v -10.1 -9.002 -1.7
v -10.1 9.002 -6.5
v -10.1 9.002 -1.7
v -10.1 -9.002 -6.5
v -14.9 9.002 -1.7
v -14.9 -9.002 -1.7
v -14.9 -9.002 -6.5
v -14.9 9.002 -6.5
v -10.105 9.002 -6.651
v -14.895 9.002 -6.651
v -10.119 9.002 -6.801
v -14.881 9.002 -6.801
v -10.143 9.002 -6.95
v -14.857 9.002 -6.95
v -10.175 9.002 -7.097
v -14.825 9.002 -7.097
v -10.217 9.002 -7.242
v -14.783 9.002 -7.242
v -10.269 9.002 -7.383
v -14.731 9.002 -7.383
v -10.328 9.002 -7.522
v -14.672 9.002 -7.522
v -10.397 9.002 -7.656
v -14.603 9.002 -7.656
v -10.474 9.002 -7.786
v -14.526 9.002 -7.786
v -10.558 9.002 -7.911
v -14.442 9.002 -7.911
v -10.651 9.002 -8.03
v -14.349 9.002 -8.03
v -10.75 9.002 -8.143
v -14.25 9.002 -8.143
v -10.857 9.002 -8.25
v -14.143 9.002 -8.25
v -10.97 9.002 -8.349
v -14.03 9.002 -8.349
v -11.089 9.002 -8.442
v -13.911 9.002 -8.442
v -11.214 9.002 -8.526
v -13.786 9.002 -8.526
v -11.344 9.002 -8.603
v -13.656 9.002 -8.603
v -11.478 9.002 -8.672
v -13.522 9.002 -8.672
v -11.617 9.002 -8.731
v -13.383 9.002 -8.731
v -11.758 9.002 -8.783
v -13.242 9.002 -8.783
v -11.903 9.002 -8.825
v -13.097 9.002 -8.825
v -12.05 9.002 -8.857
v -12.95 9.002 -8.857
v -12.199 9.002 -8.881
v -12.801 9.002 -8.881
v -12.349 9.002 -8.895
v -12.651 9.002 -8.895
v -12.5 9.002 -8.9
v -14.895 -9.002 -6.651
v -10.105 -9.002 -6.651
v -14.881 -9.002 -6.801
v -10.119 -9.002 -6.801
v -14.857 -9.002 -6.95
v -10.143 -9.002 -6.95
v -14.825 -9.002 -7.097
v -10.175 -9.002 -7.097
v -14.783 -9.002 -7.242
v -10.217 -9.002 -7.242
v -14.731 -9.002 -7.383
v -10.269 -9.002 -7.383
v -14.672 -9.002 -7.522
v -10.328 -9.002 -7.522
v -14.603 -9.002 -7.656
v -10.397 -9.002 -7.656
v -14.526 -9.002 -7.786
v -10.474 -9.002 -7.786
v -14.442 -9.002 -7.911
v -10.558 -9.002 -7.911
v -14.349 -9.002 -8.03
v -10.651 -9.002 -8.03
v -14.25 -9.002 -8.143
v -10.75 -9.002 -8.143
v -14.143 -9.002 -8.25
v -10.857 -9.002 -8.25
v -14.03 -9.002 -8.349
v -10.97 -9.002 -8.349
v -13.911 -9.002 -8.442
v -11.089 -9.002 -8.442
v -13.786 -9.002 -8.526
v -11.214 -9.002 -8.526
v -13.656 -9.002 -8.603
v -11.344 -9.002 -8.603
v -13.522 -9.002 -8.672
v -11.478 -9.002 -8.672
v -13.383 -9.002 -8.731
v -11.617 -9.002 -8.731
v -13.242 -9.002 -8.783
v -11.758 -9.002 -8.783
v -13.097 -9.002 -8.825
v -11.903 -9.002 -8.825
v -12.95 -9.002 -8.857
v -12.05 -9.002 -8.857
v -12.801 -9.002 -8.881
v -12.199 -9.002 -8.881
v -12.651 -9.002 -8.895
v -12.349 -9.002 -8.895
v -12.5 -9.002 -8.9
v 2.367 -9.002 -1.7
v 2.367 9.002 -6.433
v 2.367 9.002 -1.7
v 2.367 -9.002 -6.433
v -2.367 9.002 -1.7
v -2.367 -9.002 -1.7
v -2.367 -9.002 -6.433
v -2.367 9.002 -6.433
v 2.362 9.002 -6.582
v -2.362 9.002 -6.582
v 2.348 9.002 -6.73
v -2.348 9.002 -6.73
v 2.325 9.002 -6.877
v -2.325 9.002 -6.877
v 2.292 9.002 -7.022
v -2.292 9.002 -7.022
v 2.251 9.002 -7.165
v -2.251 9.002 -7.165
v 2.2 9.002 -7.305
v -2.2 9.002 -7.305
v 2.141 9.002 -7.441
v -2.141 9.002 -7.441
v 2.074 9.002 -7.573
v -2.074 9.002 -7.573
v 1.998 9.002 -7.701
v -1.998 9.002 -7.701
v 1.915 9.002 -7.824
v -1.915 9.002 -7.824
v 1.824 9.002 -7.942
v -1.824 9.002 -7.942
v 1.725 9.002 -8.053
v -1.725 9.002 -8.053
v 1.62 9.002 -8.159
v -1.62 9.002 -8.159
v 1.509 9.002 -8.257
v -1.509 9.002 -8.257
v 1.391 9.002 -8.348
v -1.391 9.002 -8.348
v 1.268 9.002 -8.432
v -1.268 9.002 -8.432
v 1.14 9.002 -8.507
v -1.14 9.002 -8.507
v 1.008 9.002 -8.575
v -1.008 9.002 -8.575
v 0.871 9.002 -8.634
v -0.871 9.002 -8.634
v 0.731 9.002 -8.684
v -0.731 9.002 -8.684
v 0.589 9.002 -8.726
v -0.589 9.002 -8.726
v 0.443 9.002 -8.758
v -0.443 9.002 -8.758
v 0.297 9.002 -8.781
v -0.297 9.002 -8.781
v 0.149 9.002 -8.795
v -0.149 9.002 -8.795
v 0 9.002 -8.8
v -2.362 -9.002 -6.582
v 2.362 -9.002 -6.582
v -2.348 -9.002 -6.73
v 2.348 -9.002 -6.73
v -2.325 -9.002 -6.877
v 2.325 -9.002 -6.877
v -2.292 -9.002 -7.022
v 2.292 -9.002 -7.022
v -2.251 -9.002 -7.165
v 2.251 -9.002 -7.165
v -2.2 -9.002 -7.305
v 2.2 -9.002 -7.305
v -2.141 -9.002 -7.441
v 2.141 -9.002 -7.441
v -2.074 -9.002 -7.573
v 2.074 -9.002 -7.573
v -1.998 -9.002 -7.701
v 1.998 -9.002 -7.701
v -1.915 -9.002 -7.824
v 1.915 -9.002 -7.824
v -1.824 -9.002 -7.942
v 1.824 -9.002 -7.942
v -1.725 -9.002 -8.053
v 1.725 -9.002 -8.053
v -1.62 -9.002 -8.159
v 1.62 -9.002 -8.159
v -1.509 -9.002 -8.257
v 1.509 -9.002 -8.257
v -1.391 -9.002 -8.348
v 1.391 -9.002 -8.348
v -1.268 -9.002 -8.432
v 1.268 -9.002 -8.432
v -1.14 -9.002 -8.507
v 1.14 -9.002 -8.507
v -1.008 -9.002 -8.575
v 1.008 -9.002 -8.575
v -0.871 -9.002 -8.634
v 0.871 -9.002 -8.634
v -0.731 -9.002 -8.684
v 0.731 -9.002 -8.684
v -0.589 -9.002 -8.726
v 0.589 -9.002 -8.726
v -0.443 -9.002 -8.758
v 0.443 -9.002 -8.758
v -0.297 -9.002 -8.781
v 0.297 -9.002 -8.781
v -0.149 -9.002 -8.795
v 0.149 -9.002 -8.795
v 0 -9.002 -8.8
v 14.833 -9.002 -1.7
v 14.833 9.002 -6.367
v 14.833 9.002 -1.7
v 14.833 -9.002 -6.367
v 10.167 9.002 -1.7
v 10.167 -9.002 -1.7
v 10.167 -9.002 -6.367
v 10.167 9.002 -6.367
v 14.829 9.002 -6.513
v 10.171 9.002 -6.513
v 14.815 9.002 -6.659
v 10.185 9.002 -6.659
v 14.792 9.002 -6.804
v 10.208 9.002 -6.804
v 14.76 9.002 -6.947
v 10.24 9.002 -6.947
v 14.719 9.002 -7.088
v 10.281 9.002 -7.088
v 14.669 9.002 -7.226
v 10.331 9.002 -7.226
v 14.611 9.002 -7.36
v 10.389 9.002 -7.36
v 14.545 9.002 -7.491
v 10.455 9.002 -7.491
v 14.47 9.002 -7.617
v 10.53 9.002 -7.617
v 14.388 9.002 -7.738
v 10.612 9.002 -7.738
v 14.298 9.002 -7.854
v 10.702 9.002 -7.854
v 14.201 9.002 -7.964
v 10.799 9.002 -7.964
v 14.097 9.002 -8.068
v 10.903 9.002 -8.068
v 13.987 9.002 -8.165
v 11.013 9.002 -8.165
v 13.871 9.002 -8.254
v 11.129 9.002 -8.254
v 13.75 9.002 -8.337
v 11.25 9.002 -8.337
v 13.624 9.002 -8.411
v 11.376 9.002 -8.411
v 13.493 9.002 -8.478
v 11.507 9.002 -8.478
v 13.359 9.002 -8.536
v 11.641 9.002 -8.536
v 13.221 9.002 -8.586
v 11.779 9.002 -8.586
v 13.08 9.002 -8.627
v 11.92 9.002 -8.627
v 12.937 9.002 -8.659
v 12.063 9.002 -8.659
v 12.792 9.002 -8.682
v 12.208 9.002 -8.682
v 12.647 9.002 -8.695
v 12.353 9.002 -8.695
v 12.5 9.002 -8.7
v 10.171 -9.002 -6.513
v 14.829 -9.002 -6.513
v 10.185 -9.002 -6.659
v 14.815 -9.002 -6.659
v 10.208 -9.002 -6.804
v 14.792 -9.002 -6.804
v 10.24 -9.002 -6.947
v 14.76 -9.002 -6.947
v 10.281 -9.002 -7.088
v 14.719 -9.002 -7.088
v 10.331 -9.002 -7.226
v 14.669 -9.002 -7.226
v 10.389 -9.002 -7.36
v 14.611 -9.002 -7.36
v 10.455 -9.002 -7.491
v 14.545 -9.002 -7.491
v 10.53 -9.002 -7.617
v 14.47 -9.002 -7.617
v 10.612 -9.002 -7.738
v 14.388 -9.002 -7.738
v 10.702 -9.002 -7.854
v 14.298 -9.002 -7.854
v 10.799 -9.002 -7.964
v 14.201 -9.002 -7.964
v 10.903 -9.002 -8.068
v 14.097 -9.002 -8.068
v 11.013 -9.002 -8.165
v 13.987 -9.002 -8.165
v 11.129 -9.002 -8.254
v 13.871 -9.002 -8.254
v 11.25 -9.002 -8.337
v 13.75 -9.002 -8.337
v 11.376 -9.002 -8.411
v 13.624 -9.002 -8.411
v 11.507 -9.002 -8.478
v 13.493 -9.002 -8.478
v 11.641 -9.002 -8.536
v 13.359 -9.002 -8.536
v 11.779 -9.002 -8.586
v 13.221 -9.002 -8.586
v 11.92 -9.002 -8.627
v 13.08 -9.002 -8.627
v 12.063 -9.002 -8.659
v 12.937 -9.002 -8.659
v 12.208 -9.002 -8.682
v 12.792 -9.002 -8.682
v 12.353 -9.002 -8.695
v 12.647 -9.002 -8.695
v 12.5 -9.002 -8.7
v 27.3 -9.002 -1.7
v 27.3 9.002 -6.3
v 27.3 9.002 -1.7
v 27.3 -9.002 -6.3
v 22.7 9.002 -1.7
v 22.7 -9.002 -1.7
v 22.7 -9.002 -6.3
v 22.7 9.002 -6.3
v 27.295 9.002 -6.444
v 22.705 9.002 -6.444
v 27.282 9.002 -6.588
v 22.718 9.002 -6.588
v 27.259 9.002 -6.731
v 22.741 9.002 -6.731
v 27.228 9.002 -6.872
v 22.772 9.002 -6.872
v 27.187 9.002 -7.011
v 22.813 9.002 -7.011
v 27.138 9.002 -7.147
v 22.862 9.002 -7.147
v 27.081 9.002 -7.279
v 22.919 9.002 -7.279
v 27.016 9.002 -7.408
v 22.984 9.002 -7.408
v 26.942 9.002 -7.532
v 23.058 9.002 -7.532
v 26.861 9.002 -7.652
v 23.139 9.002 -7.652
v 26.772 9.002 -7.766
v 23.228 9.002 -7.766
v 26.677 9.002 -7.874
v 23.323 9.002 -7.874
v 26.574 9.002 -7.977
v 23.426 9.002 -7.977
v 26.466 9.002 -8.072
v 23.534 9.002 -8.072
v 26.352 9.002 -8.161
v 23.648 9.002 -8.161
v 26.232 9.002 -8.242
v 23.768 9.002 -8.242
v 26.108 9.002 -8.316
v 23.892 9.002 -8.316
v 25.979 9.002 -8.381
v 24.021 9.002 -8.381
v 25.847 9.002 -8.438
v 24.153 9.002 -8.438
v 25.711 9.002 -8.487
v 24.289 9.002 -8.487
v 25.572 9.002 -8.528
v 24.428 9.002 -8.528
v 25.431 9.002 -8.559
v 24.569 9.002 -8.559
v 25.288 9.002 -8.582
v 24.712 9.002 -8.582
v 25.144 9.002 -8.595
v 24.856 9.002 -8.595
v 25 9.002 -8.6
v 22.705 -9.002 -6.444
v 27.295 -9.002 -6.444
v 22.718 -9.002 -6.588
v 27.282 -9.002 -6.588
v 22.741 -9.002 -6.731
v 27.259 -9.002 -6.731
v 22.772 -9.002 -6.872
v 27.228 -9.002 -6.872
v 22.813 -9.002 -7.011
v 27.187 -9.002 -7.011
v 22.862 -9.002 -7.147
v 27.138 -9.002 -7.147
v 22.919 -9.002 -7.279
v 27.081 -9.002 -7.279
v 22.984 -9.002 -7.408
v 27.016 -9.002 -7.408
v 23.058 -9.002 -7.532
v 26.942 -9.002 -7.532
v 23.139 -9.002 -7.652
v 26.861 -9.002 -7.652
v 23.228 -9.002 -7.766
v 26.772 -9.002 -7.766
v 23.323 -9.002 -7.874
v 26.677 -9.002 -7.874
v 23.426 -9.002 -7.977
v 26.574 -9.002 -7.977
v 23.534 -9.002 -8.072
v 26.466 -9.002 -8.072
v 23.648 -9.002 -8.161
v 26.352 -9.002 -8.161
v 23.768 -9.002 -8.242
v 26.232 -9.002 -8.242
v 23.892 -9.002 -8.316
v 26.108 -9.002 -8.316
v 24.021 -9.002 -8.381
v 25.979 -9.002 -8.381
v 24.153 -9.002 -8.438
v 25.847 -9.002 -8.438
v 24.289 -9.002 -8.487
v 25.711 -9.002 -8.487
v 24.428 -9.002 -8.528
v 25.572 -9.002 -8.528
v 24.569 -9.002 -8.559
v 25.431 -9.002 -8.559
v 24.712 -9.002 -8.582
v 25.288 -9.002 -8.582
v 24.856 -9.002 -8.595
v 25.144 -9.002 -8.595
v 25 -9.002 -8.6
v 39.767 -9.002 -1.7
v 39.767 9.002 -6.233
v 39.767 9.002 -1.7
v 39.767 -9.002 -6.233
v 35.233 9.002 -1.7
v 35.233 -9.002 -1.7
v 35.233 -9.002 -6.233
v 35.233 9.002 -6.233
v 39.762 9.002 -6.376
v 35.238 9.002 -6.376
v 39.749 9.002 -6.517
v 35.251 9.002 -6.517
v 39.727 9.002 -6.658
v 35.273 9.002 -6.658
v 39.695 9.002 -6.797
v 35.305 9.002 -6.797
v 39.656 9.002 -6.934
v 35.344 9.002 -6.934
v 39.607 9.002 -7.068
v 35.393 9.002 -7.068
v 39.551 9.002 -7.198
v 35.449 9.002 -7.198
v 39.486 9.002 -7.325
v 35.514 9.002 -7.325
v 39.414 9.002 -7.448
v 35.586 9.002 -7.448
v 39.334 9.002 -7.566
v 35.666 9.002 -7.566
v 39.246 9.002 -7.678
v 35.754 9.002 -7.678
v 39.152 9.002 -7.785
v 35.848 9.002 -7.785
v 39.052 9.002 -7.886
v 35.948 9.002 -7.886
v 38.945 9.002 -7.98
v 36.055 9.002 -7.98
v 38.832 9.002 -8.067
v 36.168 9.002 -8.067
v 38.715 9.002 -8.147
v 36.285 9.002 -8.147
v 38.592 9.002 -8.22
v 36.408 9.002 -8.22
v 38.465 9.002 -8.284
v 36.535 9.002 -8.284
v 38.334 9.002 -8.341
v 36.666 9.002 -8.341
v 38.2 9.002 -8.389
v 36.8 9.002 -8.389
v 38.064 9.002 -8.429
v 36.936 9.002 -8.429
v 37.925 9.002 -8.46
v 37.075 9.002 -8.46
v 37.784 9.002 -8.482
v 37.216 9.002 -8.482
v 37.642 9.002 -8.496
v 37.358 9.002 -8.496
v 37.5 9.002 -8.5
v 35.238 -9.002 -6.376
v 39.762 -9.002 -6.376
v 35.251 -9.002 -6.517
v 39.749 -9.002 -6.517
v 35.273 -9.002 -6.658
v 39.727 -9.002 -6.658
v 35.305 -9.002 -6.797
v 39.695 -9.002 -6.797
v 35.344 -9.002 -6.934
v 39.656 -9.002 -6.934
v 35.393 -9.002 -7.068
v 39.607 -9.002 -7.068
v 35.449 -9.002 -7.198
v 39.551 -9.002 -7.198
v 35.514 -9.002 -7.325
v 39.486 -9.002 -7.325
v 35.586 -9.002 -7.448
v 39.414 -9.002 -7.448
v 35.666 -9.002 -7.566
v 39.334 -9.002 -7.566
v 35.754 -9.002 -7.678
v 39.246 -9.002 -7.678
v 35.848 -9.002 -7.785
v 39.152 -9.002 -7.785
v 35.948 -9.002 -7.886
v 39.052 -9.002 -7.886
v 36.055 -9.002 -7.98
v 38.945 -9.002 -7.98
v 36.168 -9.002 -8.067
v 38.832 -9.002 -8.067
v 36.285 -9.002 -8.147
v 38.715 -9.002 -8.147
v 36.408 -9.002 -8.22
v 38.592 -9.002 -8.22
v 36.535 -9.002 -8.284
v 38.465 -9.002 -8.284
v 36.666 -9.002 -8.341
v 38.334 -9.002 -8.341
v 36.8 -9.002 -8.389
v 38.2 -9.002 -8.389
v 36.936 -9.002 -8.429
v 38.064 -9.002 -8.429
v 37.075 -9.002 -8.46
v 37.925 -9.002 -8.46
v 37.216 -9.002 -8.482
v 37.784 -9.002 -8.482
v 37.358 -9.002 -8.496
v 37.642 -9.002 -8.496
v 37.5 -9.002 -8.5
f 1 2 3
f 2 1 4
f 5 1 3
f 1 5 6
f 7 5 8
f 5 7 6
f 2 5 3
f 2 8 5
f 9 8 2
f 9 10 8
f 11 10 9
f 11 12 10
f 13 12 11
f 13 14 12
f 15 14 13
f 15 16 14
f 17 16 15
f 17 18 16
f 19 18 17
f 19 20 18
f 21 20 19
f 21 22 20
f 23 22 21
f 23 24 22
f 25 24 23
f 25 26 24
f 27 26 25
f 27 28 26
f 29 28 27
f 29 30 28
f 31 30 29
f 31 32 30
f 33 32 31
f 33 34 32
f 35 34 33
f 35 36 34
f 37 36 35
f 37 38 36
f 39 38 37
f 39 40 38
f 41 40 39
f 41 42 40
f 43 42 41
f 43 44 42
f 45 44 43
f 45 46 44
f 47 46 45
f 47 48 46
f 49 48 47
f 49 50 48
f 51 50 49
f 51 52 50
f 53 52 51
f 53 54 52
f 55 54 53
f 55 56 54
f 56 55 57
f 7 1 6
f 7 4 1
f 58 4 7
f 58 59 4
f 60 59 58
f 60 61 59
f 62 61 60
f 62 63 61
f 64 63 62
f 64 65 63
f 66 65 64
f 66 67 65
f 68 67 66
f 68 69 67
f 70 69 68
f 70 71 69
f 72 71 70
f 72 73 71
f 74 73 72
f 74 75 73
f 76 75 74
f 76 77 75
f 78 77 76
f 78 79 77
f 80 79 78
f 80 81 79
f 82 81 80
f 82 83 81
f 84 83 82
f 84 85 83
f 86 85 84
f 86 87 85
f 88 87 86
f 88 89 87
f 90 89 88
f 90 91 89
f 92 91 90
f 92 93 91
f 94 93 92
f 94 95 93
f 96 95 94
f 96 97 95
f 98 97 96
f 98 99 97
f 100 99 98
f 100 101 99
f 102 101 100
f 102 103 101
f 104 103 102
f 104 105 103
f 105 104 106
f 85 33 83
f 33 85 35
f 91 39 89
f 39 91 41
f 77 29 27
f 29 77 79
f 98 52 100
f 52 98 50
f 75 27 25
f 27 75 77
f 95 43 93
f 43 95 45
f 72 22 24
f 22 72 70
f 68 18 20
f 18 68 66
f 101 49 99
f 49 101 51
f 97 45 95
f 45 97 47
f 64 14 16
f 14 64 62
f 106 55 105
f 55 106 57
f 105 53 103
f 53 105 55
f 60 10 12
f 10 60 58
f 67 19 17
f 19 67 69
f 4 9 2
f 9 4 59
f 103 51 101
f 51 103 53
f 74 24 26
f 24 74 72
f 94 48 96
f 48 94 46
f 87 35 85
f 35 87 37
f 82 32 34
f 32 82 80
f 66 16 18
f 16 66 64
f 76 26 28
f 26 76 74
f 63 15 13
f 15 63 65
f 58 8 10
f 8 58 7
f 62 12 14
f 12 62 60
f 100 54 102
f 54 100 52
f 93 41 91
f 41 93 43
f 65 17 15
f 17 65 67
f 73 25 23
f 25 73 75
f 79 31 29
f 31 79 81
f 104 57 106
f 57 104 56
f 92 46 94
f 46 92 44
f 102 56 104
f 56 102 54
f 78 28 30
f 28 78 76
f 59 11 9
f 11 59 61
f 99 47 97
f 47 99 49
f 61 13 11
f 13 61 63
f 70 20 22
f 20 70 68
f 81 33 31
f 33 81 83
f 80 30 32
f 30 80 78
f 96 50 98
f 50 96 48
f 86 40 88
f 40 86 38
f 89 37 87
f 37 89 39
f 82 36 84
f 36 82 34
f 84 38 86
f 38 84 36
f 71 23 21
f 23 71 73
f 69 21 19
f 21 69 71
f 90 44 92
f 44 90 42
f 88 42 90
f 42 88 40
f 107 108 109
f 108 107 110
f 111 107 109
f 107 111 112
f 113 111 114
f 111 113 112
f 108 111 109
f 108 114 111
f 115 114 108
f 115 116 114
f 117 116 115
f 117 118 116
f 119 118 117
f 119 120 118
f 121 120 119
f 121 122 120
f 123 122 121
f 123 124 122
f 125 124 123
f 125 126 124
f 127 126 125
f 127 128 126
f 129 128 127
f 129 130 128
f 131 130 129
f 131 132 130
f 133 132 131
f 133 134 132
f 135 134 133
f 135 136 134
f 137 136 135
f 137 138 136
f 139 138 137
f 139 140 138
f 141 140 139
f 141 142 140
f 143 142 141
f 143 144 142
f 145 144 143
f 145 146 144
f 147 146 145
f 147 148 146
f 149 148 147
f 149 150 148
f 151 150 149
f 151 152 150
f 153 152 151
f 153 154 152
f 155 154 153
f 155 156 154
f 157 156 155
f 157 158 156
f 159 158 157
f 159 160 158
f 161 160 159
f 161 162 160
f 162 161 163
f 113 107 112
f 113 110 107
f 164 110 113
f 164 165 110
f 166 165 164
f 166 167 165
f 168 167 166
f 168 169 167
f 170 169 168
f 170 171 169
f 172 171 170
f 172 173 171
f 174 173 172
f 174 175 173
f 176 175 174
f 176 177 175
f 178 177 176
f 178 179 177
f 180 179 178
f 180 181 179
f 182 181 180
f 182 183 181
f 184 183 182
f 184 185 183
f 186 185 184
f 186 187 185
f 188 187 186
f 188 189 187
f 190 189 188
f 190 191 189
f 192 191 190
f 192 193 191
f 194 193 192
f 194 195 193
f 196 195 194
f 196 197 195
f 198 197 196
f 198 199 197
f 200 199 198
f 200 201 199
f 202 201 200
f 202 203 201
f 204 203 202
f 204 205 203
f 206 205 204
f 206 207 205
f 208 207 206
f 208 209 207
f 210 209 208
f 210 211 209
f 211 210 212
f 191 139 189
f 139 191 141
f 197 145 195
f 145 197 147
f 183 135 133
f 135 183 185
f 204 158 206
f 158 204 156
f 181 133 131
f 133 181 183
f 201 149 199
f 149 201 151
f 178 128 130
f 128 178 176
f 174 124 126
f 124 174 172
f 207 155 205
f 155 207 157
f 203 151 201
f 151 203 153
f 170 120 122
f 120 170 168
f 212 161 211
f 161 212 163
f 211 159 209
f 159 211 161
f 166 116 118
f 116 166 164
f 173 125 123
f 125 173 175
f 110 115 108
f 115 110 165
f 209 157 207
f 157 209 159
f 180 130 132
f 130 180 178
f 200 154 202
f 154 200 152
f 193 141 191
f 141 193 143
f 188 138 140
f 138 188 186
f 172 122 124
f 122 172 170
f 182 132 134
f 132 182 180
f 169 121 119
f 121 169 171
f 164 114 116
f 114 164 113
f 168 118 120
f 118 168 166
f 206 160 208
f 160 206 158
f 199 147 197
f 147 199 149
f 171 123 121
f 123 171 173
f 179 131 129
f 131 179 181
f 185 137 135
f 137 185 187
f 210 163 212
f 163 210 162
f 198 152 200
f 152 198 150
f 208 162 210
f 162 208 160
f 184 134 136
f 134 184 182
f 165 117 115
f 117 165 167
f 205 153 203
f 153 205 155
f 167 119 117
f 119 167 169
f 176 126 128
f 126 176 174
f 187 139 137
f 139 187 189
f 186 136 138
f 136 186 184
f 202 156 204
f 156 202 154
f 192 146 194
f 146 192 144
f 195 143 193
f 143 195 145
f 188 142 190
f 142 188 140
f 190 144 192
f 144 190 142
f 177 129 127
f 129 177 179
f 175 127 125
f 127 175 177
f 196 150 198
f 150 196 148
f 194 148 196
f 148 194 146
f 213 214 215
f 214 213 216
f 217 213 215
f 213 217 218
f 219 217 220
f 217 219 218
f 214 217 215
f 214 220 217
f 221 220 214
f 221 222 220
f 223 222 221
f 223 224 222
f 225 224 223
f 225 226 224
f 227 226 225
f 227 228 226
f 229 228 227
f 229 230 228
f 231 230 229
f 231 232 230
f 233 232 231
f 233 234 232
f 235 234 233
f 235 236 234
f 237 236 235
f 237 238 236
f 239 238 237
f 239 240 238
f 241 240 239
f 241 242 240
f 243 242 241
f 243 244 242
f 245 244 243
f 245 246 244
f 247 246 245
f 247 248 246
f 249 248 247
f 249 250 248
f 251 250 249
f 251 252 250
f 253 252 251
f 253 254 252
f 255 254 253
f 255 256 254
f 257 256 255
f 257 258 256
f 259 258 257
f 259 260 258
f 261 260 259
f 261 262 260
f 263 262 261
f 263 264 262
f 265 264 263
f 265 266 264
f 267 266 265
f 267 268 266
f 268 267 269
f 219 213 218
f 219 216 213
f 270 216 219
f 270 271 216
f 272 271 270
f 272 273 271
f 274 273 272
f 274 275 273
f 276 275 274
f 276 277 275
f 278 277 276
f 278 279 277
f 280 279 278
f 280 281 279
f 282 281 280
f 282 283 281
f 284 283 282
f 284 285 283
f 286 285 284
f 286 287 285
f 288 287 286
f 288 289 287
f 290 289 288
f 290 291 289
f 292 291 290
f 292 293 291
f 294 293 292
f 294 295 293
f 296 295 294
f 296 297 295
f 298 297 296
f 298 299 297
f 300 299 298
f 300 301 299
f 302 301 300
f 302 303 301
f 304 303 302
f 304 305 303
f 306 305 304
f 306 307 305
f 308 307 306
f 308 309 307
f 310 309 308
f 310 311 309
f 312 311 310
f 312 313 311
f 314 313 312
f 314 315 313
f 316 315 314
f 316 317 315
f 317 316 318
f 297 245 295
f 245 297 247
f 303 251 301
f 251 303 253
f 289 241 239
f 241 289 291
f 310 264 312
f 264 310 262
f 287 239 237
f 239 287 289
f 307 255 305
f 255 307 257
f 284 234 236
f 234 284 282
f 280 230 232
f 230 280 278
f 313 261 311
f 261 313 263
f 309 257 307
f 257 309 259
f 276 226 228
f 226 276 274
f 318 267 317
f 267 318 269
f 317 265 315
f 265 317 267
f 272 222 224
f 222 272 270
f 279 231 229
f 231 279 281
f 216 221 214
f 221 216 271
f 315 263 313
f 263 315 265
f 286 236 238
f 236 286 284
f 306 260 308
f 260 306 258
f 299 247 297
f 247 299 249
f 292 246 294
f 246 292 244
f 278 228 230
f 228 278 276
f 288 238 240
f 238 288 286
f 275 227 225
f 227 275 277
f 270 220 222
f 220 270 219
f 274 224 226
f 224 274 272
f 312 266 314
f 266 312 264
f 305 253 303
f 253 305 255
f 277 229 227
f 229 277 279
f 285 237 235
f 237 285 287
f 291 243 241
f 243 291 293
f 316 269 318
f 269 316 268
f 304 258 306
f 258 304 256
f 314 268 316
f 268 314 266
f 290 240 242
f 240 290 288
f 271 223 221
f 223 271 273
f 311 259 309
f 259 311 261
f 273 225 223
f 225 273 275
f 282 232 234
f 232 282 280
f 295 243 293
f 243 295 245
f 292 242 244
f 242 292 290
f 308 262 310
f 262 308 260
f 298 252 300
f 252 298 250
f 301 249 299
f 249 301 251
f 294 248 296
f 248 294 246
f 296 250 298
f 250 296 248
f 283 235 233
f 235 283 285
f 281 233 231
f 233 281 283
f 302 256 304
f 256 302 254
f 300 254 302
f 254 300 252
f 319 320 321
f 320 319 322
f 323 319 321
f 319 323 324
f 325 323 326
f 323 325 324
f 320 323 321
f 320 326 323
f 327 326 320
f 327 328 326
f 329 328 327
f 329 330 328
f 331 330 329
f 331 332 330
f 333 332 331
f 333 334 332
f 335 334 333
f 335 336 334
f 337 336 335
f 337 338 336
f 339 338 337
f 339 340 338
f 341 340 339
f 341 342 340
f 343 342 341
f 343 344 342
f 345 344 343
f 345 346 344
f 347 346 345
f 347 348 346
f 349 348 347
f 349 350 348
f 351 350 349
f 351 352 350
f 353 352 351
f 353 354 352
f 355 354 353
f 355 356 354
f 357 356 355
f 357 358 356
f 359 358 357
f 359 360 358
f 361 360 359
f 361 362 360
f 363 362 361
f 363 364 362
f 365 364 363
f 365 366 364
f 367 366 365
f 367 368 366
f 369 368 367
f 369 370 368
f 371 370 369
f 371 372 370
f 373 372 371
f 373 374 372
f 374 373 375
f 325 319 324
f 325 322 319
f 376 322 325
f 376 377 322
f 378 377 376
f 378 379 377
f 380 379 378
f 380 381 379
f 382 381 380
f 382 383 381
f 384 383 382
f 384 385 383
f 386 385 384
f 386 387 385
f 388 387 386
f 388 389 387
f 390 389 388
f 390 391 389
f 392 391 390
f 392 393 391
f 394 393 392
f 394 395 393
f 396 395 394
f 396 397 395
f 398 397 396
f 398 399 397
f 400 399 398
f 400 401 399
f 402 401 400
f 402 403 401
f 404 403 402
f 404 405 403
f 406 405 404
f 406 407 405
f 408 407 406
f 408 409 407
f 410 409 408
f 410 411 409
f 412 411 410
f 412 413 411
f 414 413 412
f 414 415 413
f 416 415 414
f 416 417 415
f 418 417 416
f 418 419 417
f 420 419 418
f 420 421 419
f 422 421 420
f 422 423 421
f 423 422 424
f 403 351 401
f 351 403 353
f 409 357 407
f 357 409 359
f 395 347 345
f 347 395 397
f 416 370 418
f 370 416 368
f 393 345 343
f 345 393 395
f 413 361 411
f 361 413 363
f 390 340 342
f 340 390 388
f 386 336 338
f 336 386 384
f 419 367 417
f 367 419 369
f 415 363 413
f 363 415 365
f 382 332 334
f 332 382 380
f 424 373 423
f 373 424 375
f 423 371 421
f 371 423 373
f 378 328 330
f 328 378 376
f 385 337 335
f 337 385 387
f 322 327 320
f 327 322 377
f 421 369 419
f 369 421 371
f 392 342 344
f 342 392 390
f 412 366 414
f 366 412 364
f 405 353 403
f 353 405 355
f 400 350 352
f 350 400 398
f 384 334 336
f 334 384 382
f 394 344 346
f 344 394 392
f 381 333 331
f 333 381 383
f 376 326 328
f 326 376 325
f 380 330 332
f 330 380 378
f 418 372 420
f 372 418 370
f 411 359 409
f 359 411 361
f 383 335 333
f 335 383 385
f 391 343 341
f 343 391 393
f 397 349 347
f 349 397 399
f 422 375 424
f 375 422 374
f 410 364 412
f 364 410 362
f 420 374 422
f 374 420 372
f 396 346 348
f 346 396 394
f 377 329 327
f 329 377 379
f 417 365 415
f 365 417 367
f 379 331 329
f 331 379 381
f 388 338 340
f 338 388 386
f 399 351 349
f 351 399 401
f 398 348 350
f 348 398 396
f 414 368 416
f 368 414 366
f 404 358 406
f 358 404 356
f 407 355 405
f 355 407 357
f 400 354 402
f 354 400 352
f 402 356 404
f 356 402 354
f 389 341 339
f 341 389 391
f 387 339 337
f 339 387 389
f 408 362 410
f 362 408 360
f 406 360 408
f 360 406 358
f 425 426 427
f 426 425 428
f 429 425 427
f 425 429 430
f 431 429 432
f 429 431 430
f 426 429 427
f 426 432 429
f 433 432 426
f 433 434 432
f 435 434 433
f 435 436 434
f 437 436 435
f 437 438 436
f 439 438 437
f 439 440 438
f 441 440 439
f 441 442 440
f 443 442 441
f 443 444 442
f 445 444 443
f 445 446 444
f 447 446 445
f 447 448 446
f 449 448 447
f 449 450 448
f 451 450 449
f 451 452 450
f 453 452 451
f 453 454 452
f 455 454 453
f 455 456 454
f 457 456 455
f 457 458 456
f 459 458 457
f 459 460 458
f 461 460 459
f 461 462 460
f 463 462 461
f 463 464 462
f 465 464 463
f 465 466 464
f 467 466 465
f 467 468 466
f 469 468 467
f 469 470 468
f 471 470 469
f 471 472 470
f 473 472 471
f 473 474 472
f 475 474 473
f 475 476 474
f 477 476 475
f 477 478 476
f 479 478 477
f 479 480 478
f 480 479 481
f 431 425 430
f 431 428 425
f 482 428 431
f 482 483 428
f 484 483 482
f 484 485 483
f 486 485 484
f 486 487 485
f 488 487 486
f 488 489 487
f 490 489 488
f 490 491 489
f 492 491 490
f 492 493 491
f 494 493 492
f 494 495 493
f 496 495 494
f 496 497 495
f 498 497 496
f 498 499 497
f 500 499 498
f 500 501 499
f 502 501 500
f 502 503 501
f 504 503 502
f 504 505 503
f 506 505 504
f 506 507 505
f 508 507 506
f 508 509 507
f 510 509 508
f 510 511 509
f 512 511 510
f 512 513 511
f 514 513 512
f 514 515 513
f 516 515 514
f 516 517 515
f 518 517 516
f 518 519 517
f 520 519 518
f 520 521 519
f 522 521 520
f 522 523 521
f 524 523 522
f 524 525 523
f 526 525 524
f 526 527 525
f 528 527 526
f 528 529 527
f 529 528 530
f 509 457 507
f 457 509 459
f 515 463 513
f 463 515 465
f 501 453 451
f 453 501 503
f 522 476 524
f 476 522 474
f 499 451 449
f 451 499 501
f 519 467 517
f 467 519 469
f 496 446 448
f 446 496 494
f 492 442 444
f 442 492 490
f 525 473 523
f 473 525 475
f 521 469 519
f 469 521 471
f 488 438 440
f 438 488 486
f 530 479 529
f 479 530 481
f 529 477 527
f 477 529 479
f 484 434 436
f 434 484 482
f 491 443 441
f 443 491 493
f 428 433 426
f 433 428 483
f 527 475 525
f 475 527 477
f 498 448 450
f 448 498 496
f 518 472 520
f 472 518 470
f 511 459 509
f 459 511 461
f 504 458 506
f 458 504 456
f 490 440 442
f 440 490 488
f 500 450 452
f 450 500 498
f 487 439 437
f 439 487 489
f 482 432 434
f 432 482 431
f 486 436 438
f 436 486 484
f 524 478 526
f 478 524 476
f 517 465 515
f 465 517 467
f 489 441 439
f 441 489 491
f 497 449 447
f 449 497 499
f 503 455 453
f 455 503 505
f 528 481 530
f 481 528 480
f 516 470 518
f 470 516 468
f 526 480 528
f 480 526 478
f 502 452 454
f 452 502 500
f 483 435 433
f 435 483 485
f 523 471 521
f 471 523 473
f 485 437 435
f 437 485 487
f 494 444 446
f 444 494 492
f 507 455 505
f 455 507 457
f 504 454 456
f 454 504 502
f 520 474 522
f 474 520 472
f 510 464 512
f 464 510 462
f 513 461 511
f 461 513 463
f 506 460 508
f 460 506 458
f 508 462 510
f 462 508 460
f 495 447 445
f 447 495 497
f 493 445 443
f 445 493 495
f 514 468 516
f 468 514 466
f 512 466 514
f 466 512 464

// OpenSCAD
$fn=100;

frameFrontThickness = 2;
frameWallThickness  = 2;

usbFrontWidth        = 31;
usbFrontHeight       = 10;
usbFrontDepth        = 1.7;

usbBaseWidth            = 13;
usbBaseHeight           = 7;
usbBaseDepth            = 19;

usbFrontOffset      = 0;

UsbMountThingyWidth = 5;
UsbMountThingyHeight = UsbMountThingyWidth*1.5;

displayWidth        = 51;
displayHeight       = 20;
displayDepth        = 8;

displayBaseWidth    = 72;
displayBaseHeight   = 28;
displayBaseDepth    = usbBaseDepth;

//displayFrontOffset  = frameFrontThickness;
displayFrontOffset  = 0.4;


buttonDiameterTop   = 20;
buttonDiameterBottom= 25;
buttonDepth         = 2;

buttonBaseDiameter  = 23;
buttonBaseDepth     = usbBaseDepth;

buttonFrontOffset   = frameFrontThickness;


frameWidth          = displayWidth*2+usbBaseWidth*2+buttonDiameterBottom*2;
frameHeight         = displayHeight*2;
frameDepth          = frameFrontThickness;

frameBaseWidth      = frameWidth-4;
frameBaseHeight     = frameHeight-4;
frameBaseDepth      = usbBaseDepth-frameFrontThickness-0.1;


//usbThingyWidth = usbFrontHeight*0.6;
//usbThingyBridgeHeight = usbBaseHeight*4;
//usbThingyContactDepth = frameBaseDepth/2 - usbFrontDepth;

usbXcenterPos = -displayBaseWidth+5;

module Layer01a_UsbMountThingy()
{    
    translate([0,0,-UsbMountThingyWidth/2]) cube([UsbMountThingyWidth,frameBaseHeight+0.01,UsbMountThingyWidth], center=true);

    translate([0,0,+UsbMountThingyWidth/2-UsbMountThingyHeight]) rotate([90,0,0]) cylinder(h=frameBaseHeight+0.01, d=UsbMountThingyWidth, center=true);
}

module Layer01b_UsbMountThingies(distance,scale) 
{
    for(xPos = [-distance/2, +distance/2]) {
        translate([xPos,0,usbFrontOffset-usbFrontDepth])scale([scale,1,scale])
Layer01a_UsbMountThingy();        
    }
}

module Layer01c_UsbMountThingiesFitSelection() 
{
    for(count = [3,4,5,6,7]) {
        translate([UsbMountThingyWidth*(count-4)*2.5,0,usbFrontOffset])scale([1,0.5,1])Layer01b_UsbMountThingies(0, (UsbMountThingyHeight-count*0.1)/UsbMountThingyHeight);
    }
}

module Layer01_UsbCutout()
{
    color("green") {    
    
        // Frame cutout
        translate([0,0,+usbBaseDepth/2-0.01]) cube([usbBaseWidth+2, usbBaseHeight+2, usbBaseDepth], center=true);
    
        // Device base
        translate([0,0,-usbBaseDepth/2]) cube([usbFrontWidth+0.25, usbFrontHeight+0.25, usbBaseDepth], center=true);

    translate([0,0,usbFrontOffset])Layer01b_UsbMountThingies(usbFrontWidth-UsbMountThingyWidth, 1);
    }    
}

module Layer02_DisplayCutout()
{
    color("red") {
//        // Frame cutout
//        translate([0,0,+displayDepth/2-0.01]) cube([displayWidth-2, displayHeight-2, displayDepth], center=true);
        
        // Actual display
        translate([0,0,-displayDepth/2]) cube([displayWidth, displayHeight, displayDepth], center=true);

        // Display base
        translate([0,0,-displayDepth-displayBaseDepth/2+0.01]) cube([displayBaseWidth, displayBaseHeight, displayBaseDepth], center=true);
    }
}

module Layer03_PushbuttonCutout()
{
    color("blue") {    
        // Actual button
        translate([0,0,+buttonDepth/2]) cylinder(h=buttonDepth, d1=buttonDiameterBottom, d2=buttonDiameterTop, center=true);

        // Button base
        translate([0,0,-buttonBaseDepth/2+0.01]) cylinder(h=buttonBaseDepth, d=buttonBaseDiameter, center=true);
        
        // Button base mount space
        translate([0,0,-frameFrontThickness-buttonBaseDepth/2+0.01]) cylinder(h=buttonBaseDepth, d=frameBaseHeight-frameWallThickness*2, center=true);
        
    }
}
    
module Layer09_FullUiCutout()
{
    translate([+displayBaseWidth-5,0,buttonFrontOffset+0.01]) Layer03_PushbuttonCutout();
    translate([0,0,displayFrontOffset+0.01]) Layer02_DisplayCutout();
    translate([usbXcenterPos,0,usbFrontOffset]) Layer01_UsbCutout();    
}


module Layer10_FrameSolid(adder)
{
    scale([(frameBaseWidth+adder)/frameBaseWidth, (frameBaseHeight+adder)/frameBaseHeight, (frameBaseDepth+adder)/frameBaseDepth]) {
        // Actual Frame
        translate([0,0,+frameDepth/2]) cube([frameWidth, frameHeight, frameDepth], center=true);

        // Frame base
        translate([0,0,-frameBaseDepth/2]) cube([frameBaseWidth, frameBaseHeight, frameBaseDepth], center=true);
    }    
}

module Layer11_BackCoverStripHoleCutout(depth)
{
    for(xPos = [-displayBaseWidth-10, +displayBaseWidth+10]) {
        hull() {
            translate([xPos/2,0,-UsbMountThingyWidth/2]) rotate([90,0,0]) cylinder(d=UsbMountThingyWidth, h=frameBaseHeight+10, center=true);
            translate([xPos/2,0,-UsbMountThingyWidth/2-depth]) rotate([90,0,0]) cylinder(d=UsbMountThingyWidth, h=frameBaseHeight+10, center=true);
        }
    }
}

module Layer12_BackCoverCableHoleCutout(depth, length)
{
    hull() {
        translate([0,0,0]) rotate([0,90,0]) cylinder(d=UsbMountThingyWidth, h=length, center=true);

    translate([0,0,0-depth]) rotate([0,90,0]) cylinder(d=UsbMountThingyWidth, h=length, center=true);
    }
}


module Layer19_FinalFrame()
{
    difference() {
        Layer10_FrameSolid(0);
        Layer09_FullUiCutout();
        translate([0,0,-UsbMountThingyWidth*1.0])Layer11_BackCoverStripHoleCutout(0);
        color("chocolate")         translate([+frameBaseWidth*0.5,frameBaseHeight*0.37,-UsbMountThingyWidth/2-3]) Layer12_BackCoverCableHoleCutout(12,frameBaseWidth/5);

    color("aqua")         translate([+frameBaseWidth*0.25,frameBaseHeight*0.315,-UsbMountThingyWidth*2.5]) Layer12_BackCoverCableHoleCutout(7,frameBaseWidth/5);

    color("lime")         translate([-frameBaseWidth*0.25,frameBaseHeight*0.07,-UsbMountThingyWidth*2.5]) Layer12_BackCoverCableHoleCutout(7,frameBaseWidth/5);
    }
}

module Layer20_BackCover()
{
    difference() {
        translate([0,0,-(frameBaseDepth+frameWallThickness)/2]) cube([frameBaseWidth+frameWallThickness*2, frameBaseHeight+frameWallThickness*2, frameBaseDepth+frameWallThickness], center=true);
        translate([0,0,+0.01]) Layer10_FrameSolid(0.5);
        translate([0,0,-UsbMountThingyWidth*0.6]) Layer11_BackCoverStripHoleCutout(8);
        color("chocolate")         translate([+frameBaseWidth*0.5,frameBaseHeight*0.37,-UsbMountThingyWidth/2+2+4]) Layer12_BackCoverCableHoleCutout(10,frameBaseWidth/5);

    }
}

//Layer19_FinalFrame();
//Layer20_BackCover();
Layer01c_UsbMountThingiesFitSelection();
